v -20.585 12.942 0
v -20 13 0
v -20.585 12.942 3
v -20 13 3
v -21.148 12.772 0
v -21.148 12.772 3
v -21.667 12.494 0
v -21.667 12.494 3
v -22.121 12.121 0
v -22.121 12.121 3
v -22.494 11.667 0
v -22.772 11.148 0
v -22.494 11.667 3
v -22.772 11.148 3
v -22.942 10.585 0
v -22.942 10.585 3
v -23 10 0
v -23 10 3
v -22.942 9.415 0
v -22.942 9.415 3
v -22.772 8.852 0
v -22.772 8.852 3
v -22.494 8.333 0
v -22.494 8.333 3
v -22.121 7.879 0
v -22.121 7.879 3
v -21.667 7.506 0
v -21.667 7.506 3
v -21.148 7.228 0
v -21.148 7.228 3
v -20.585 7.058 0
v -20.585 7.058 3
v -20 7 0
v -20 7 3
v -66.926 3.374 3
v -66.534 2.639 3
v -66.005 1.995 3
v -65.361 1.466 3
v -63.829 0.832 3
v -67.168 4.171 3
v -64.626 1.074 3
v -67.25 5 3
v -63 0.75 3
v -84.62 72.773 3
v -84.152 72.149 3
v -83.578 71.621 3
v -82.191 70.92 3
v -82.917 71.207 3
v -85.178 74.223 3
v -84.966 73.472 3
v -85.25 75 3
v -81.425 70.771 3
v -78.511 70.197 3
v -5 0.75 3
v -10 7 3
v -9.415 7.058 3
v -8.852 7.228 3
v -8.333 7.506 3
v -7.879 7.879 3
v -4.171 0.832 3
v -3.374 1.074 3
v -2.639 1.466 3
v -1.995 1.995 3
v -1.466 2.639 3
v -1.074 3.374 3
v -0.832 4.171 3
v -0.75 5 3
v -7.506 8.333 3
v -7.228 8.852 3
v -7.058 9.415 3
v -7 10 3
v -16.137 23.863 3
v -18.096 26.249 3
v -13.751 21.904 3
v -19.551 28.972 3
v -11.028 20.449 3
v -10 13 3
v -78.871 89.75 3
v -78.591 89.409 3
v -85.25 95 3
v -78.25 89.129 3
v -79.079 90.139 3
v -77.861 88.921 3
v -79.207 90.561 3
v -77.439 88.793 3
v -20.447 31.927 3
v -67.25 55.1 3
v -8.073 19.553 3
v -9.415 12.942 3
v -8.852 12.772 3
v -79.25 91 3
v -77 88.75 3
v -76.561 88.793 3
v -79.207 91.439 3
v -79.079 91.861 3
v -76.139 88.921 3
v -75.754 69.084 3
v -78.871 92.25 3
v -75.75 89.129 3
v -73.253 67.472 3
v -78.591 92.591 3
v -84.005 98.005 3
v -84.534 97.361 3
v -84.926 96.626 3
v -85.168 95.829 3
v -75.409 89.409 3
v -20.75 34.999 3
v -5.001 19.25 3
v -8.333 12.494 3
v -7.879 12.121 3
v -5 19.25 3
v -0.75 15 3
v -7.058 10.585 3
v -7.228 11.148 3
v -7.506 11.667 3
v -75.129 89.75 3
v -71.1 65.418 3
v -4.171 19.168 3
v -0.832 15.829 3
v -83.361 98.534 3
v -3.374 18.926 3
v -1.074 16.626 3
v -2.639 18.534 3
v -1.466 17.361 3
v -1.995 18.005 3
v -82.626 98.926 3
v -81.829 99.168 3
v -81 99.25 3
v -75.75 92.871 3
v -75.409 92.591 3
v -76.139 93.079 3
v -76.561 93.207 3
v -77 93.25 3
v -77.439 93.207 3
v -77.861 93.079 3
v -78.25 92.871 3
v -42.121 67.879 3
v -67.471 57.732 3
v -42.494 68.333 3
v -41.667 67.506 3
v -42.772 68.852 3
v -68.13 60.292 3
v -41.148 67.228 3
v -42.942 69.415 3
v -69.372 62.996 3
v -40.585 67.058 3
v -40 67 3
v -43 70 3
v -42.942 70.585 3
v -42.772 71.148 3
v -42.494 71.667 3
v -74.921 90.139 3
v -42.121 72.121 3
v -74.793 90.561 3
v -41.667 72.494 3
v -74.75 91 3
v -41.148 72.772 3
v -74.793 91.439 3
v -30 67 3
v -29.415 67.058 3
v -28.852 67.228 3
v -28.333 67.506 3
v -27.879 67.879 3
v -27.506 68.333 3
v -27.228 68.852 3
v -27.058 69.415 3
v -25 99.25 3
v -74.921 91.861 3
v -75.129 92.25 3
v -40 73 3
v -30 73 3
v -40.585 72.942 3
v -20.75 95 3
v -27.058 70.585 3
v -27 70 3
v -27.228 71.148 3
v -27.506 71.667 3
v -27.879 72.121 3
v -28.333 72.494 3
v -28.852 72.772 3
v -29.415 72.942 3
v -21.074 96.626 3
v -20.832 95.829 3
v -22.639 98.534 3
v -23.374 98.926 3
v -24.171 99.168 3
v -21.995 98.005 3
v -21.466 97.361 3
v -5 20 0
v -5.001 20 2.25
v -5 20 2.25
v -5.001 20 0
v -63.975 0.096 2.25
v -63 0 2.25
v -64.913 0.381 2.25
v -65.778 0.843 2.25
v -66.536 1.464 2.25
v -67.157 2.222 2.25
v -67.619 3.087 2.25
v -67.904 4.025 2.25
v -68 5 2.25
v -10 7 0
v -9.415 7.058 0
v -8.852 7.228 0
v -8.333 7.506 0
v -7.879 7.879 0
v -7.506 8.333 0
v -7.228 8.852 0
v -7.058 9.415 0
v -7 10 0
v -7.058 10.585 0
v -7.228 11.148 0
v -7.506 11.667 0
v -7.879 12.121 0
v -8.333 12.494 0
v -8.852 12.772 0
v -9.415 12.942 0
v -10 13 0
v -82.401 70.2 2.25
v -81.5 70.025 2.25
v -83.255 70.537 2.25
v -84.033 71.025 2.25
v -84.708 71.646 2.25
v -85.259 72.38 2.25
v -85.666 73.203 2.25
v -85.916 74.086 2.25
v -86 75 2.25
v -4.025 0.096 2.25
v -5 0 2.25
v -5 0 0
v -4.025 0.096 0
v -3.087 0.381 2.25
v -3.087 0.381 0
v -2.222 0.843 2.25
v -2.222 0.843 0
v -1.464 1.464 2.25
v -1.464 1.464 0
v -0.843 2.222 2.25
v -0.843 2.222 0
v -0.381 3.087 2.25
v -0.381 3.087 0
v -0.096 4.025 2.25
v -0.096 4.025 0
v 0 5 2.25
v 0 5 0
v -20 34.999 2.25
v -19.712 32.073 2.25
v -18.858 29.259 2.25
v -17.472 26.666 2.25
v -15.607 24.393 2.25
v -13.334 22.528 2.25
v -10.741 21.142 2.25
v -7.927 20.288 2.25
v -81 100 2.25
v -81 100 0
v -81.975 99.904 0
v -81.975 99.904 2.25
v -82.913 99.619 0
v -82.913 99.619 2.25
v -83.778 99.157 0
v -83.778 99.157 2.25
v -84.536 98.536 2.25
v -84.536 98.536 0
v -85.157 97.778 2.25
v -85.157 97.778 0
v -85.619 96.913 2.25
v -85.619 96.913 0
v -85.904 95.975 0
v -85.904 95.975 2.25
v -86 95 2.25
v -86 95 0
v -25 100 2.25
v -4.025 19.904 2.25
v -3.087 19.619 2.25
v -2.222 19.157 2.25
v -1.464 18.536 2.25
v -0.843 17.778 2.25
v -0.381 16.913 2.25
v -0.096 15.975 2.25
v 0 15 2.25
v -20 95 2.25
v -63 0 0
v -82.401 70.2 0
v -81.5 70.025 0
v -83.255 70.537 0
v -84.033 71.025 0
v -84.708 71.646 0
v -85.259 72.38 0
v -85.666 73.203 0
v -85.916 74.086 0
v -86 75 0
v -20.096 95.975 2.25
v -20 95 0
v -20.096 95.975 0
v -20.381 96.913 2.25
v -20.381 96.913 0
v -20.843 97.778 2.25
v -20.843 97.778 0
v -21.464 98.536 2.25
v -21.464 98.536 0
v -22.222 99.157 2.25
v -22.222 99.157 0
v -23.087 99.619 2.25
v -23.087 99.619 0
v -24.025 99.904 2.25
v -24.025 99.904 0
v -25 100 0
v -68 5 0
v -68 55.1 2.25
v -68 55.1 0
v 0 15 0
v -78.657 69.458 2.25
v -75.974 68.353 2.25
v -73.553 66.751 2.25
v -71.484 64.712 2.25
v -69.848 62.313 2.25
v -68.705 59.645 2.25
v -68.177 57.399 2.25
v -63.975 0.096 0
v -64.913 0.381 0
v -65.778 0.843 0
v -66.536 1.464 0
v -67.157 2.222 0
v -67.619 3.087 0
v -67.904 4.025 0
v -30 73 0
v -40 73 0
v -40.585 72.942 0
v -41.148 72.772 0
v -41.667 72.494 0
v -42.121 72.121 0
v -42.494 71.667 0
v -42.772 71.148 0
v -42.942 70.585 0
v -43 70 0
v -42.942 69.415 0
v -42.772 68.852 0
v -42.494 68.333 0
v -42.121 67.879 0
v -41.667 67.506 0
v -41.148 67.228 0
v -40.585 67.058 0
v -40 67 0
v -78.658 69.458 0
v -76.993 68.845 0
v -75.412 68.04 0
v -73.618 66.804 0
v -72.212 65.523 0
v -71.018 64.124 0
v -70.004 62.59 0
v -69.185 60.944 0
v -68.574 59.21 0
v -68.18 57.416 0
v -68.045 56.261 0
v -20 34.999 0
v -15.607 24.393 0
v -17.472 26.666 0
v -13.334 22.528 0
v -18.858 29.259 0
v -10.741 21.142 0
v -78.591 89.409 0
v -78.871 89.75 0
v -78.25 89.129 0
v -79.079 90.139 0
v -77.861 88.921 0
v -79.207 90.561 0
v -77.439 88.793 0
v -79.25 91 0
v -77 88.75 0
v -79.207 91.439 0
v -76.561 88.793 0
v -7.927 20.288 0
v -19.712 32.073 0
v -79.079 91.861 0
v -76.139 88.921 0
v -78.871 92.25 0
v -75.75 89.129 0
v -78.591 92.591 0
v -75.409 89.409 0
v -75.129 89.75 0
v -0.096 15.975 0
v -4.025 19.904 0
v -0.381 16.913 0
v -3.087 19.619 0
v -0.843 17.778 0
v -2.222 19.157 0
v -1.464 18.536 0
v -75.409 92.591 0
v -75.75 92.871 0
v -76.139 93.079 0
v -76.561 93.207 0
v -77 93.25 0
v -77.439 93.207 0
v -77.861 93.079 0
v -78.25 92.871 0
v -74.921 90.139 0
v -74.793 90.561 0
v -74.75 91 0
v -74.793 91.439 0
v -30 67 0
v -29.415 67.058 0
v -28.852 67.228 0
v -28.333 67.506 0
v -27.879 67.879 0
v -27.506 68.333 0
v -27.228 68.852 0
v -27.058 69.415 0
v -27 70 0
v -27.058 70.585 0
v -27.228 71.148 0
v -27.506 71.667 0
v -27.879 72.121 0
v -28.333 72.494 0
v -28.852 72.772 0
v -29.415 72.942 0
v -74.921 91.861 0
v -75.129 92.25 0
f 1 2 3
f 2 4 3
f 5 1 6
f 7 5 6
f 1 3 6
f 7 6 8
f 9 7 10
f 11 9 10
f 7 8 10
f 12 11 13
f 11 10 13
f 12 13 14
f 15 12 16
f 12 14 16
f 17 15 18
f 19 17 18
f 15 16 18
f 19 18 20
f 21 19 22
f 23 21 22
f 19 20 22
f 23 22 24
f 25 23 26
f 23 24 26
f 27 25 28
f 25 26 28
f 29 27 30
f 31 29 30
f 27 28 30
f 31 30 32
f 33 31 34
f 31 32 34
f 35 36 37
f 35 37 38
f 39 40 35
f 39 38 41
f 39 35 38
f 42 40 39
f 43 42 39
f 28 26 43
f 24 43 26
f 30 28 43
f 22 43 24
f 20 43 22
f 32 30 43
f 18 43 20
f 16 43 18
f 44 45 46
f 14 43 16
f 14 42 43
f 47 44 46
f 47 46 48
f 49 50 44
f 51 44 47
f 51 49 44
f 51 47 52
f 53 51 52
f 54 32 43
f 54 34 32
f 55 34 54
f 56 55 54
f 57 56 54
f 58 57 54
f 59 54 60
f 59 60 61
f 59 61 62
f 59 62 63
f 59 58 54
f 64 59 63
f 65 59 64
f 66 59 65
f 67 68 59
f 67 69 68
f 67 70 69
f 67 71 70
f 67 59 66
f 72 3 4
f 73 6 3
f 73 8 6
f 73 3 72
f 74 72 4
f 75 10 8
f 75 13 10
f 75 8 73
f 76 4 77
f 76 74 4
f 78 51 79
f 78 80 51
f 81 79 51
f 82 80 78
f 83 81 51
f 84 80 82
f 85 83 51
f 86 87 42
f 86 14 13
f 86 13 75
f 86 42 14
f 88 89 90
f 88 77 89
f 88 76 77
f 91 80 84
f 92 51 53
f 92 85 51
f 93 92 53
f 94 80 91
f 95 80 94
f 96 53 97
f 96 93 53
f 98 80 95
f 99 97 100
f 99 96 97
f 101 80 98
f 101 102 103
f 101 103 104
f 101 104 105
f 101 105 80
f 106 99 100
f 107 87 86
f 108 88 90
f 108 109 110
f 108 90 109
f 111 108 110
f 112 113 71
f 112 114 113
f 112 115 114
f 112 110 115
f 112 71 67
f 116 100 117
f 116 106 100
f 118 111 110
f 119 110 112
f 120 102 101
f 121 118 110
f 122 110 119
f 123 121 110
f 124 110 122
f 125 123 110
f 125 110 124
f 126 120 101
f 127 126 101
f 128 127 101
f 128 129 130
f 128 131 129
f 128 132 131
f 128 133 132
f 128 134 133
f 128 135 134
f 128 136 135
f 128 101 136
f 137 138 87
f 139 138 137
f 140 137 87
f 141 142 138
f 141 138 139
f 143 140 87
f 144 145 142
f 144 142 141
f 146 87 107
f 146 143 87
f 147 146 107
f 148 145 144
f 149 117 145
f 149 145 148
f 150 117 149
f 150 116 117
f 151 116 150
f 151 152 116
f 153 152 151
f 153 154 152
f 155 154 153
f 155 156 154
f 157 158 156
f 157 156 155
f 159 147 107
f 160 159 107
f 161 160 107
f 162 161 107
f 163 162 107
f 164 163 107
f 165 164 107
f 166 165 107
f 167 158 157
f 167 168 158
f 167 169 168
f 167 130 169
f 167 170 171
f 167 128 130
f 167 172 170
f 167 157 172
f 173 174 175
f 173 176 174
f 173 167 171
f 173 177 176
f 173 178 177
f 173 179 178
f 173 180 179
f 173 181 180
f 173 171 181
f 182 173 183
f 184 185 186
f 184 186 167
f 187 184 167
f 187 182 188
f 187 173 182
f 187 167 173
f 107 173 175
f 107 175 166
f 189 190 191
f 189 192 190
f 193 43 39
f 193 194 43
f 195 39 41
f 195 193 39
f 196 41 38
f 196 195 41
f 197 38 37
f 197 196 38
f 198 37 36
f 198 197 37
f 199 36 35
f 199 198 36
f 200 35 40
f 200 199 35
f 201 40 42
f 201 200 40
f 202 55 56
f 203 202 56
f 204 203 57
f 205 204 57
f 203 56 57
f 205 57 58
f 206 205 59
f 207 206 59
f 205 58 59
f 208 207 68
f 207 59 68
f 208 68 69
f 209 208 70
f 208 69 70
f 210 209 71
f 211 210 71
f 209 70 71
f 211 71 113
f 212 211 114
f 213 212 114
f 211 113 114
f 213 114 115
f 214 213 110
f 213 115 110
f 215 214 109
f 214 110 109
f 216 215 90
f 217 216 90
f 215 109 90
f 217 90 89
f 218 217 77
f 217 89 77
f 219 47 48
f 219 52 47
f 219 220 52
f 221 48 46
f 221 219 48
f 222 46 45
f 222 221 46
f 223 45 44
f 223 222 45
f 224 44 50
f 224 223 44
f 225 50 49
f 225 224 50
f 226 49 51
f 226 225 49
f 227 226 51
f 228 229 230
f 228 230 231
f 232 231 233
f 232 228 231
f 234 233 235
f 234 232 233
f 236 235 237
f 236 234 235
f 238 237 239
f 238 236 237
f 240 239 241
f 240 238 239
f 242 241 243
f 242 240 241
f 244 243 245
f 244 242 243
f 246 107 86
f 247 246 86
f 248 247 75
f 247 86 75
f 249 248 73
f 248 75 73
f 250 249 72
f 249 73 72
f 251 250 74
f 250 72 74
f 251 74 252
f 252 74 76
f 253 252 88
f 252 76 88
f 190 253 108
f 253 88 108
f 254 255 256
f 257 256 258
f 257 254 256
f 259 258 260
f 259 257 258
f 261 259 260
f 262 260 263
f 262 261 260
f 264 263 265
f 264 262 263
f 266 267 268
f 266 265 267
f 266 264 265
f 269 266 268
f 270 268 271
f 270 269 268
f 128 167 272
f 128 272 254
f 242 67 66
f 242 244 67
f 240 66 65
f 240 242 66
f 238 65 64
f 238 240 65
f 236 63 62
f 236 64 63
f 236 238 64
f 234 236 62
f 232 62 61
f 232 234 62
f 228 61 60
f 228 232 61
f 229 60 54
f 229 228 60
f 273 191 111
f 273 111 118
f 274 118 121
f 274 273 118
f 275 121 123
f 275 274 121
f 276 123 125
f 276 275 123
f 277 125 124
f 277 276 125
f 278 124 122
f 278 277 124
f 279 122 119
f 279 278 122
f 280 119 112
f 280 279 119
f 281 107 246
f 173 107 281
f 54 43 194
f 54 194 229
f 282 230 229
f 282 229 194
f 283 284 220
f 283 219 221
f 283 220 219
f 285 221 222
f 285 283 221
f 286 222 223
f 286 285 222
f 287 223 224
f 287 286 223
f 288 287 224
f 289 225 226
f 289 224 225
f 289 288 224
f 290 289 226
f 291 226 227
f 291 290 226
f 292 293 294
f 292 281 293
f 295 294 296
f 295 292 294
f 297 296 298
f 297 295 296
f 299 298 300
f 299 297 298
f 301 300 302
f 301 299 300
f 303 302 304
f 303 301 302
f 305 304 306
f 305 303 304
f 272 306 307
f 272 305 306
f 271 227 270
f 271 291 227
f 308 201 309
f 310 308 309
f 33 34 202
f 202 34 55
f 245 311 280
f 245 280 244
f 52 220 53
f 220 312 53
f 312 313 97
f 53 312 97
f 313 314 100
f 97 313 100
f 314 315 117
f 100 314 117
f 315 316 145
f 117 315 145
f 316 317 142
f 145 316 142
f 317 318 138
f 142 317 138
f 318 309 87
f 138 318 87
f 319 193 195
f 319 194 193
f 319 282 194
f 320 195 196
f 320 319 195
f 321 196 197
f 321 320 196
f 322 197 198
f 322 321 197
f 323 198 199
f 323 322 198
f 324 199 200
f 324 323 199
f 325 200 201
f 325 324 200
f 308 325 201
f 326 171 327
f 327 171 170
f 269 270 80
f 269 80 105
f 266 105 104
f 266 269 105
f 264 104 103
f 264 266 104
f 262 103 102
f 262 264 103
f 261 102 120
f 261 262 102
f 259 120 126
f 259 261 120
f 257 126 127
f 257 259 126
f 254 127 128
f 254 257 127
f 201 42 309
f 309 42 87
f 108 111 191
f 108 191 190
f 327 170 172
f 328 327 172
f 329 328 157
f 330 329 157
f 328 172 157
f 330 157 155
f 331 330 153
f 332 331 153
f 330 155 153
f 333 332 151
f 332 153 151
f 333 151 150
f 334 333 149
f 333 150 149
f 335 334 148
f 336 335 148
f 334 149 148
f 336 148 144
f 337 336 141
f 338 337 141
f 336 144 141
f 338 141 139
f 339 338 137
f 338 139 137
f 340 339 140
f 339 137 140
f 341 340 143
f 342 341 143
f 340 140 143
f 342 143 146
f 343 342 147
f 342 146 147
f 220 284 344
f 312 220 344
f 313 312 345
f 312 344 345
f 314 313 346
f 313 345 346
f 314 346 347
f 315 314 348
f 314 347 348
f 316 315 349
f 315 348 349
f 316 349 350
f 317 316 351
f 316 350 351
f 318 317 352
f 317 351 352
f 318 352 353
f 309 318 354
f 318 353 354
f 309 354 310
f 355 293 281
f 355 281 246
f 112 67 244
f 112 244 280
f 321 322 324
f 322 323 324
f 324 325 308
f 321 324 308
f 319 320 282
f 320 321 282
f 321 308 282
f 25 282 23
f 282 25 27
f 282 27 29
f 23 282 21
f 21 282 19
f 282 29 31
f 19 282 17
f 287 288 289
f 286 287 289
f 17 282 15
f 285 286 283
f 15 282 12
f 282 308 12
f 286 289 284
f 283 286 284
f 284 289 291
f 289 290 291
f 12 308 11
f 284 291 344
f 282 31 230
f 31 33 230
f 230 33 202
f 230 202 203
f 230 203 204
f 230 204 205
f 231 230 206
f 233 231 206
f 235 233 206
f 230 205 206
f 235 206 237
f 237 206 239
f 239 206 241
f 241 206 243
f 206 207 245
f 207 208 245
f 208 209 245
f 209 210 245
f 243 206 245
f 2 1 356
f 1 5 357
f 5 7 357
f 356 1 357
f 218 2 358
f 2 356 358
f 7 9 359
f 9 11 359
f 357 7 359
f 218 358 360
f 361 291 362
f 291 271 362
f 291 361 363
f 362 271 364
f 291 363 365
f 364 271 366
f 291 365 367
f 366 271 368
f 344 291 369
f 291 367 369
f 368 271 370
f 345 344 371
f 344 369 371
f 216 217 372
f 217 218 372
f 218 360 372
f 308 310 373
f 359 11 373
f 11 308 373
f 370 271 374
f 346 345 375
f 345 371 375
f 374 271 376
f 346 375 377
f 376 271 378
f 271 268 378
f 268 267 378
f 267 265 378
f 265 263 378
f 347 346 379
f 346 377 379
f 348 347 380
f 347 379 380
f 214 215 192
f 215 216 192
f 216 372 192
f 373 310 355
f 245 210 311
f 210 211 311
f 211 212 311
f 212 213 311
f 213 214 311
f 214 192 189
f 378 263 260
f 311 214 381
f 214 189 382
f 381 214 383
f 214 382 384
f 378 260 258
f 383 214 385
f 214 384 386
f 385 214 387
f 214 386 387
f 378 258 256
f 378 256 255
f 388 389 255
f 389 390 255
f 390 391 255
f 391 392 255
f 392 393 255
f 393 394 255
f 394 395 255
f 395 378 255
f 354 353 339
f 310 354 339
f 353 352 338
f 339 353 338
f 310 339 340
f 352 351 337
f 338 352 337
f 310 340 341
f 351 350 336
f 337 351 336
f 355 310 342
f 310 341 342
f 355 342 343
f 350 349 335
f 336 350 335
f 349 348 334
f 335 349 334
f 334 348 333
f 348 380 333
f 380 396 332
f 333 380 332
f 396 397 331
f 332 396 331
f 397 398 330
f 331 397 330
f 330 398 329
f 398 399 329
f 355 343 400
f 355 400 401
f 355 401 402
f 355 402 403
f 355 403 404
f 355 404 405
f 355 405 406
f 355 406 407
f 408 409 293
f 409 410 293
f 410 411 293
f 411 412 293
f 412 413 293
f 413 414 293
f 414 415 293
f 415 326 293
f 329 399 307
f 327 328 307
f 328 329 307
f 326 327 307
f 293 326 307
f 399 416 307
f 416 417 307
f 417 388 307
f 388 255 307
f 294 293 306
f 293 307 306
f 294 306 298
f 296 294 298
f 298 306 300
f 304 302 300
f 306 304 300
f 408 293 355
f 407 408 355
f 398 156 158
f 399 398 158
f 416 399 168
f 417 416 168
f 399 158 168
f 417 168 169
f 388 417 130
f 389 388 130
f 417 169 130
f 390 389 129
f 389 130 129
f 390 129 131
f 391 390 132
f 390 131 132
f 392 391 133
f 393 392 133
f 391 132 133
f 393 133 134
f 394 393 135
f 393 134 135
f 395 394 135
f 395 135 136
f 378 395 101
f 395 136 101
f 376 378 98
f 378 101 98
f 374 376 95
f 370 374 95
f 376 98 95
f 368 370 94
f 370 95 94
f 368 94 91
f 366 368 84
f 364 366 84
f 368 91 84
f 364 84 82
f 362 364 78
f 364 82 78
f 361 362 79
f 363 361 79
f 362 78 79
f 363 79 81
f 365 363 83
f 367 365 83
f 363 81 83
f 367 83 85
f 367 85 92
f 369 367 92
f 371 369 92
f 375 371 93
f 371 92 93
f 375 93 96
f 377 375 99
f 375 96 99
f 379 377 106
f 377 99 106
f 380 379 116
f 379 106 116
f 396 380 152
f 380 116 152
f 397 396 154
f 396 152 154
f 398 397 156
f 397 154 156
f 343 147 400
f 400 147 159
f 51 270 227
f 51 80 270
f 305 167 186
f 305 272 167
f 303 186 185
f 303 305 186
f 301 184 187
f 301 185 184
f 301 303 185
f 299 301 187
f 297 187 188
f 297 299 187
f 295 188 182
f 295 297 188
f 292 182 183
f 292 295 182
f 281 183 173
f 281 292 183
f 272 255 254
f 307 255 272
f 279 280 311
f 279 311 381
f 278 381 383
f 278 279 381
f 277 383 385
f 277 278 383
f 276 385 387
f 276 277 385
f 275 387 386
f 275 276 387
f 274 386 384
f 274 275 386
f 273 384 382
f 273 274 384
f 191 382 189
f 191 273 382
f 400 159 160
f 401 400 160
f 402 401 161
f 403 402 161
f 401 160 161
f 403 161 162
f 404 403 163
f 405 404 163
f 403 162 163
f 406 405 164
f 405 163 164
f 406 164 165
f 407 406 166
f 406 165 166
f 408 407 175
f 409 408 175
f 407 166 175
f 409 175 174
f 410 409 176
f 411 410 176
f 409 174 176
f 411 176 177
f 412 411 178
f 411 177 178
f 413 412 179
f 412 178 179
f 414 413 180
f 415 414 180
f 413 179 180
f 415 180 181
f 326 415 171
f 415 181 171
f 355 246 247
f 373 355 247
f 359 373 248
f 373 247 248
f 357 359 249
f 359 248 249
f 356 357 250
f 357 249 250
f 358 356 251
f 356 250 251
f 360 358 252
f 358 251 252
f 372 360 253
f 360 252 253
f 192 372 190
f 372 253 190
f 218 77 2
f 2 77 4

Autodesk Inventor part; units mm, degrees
ref_plane "YZ Plane" through (0, 0, 0) normal (1, 0, 0) x (0, 1, 0)
ref_plane "XZ Plane" through (0, 0, 0) normal (0, 1, 0) x (-1, 0, 0)
ref_plane "XY Plane" through (0, 0, 0) normal (0, 0, 1) x (1, 0, 0)
sketch "Sketch1" plane through (0, 0, 0) normal (0, 0, 1) x (1, 0, 0)
  line L0 (0, 0) -> (-86, 0)
  line L1 (-86, 0) -> (-86, 100)
  line L2 (-86, 100) -> (-20, 100)
  line L3 (-20, 100) -> (-20, 20)
  line L4 (-20, 20) -> (0, 20)
  line L5 (0, 20) -> (0, 0)
  dimension "d0" = 20
  dimension "d1" = 20
  dimension "d2" = 100
  dimension "d3" = 86
extrude "Extrusion1" add sketch "Sketch1" along normal blind 3
sketch "Sketch2" plane through (0, 0, 3) normal (0, 0, 1) x (1, 0, 0)
  line L0 (-86, 0) -> (-68, 0)
  line L1 (-68, 0) -> (-68, 70)
  line L2 (-68, 70) -> (-86, 70)
  line L3 (-86, 70) -> (-86, 0)
  line L4 (-20, 100) -> (-86, 100) projected
  point P0 (0, 0)
  dimension "d6" = 18
  dimension "d7" = 30
extrude "Extrusion2" cut sketch "Sketch2" against normal blind 3
sketch "Sketch3" plane through (0, 0, 3) normal (0, 0, 1) x (1, 0, 0)
  line L0 (-20, 10) -> (-10, 10) construction
  line L1 (-20, 7) -> (-10, 7)
  line L2 (-10, 13) -> (-20, 13)
  arc A0 (-20, 13) -> (-20, 7) centre (-20, 10) ccw
  arc A1 (-10, 7) -> (-10, 13) centre (-10, 10) ccw
  line L3 (0, 0) -> (0, 20) projected
  line L4 (0, 20) -> (-20, 20) projected
  line L5 (-40, 70) -> (-30, 70) construction
  line L6 (-40, 67) -> (-30, 67)
  line L7 (-30, 73) -> (-40, 73)
  arc A2 (-40, 73) -> (-40, 67) centre (-40, 70) ccw
  arc A3 (-30, 67) -> (-30, 73) centre (-30, 70) ccw
  point P0 (-15, 10)
  point P1 (-35, 70)
  dimension "d10" = 15
  dimension "d11" = 10
  dimension "d12" = 3
  dimension "d13" = 10
  dimension "d14" = 20
  dimension "d15" = 3
  dimension "d16" = 10
  dimension "d17" = 60
extrude "Extrusion3" cut sketch "Sketch3" against normal blind 3
fillet "Fillet1" radius 5 6 edges at (0, 0, 1.5) (-68, 0, 1.5) (0, 20, 1.5) (-20, 100, 1.5) (-86, 70, 1.5) (-86, 100, 1.5)
fillet "Fillet1" radius 15 2 edges at (-20, 20, 1.5) (-68, 70, 1.5)
sketch "Sketch4" plane through (0, 0, 3) normal (0, 0, 1) x (1, 0, 0)
  circle A0 centre (-77, 91) radius 2.25
  line L0 (-25, 100) -> (-81, 100) projected
  line L1 (-86, 95) -> (-86, 75) projected
  point P0 (0, 0)
  dimension "d22" = 4.5
  dimension "d23" = 9
  dimension "d24" = 9
extrude "Extrusion4" cut sketch "Sketch4" against normal blind 3
chamfer "Chamfer1" distance 0.75 angle 45 14 edges at (-71.8757, 65.1626, 3) (-68, 30.0501, 3) (-66.5355, 1.4645, 3) (-34, 0, 3) (-1.4645, 1.4645, 3) (0, 10, 3) (-1.4645, 18.5355, 3) (-5.0005, 20, 3) (-20, 64.9995, 3) (-21.4645, 98.5355, 3) (-53, 100, 3) (-84.5355, 98.5355, 3) (-86, 85, 3) (-84.7081, 71.6459, 3)
equation "\"d15\" = d12"
equation "\"d16\" = d11"
properties part number "Front"
